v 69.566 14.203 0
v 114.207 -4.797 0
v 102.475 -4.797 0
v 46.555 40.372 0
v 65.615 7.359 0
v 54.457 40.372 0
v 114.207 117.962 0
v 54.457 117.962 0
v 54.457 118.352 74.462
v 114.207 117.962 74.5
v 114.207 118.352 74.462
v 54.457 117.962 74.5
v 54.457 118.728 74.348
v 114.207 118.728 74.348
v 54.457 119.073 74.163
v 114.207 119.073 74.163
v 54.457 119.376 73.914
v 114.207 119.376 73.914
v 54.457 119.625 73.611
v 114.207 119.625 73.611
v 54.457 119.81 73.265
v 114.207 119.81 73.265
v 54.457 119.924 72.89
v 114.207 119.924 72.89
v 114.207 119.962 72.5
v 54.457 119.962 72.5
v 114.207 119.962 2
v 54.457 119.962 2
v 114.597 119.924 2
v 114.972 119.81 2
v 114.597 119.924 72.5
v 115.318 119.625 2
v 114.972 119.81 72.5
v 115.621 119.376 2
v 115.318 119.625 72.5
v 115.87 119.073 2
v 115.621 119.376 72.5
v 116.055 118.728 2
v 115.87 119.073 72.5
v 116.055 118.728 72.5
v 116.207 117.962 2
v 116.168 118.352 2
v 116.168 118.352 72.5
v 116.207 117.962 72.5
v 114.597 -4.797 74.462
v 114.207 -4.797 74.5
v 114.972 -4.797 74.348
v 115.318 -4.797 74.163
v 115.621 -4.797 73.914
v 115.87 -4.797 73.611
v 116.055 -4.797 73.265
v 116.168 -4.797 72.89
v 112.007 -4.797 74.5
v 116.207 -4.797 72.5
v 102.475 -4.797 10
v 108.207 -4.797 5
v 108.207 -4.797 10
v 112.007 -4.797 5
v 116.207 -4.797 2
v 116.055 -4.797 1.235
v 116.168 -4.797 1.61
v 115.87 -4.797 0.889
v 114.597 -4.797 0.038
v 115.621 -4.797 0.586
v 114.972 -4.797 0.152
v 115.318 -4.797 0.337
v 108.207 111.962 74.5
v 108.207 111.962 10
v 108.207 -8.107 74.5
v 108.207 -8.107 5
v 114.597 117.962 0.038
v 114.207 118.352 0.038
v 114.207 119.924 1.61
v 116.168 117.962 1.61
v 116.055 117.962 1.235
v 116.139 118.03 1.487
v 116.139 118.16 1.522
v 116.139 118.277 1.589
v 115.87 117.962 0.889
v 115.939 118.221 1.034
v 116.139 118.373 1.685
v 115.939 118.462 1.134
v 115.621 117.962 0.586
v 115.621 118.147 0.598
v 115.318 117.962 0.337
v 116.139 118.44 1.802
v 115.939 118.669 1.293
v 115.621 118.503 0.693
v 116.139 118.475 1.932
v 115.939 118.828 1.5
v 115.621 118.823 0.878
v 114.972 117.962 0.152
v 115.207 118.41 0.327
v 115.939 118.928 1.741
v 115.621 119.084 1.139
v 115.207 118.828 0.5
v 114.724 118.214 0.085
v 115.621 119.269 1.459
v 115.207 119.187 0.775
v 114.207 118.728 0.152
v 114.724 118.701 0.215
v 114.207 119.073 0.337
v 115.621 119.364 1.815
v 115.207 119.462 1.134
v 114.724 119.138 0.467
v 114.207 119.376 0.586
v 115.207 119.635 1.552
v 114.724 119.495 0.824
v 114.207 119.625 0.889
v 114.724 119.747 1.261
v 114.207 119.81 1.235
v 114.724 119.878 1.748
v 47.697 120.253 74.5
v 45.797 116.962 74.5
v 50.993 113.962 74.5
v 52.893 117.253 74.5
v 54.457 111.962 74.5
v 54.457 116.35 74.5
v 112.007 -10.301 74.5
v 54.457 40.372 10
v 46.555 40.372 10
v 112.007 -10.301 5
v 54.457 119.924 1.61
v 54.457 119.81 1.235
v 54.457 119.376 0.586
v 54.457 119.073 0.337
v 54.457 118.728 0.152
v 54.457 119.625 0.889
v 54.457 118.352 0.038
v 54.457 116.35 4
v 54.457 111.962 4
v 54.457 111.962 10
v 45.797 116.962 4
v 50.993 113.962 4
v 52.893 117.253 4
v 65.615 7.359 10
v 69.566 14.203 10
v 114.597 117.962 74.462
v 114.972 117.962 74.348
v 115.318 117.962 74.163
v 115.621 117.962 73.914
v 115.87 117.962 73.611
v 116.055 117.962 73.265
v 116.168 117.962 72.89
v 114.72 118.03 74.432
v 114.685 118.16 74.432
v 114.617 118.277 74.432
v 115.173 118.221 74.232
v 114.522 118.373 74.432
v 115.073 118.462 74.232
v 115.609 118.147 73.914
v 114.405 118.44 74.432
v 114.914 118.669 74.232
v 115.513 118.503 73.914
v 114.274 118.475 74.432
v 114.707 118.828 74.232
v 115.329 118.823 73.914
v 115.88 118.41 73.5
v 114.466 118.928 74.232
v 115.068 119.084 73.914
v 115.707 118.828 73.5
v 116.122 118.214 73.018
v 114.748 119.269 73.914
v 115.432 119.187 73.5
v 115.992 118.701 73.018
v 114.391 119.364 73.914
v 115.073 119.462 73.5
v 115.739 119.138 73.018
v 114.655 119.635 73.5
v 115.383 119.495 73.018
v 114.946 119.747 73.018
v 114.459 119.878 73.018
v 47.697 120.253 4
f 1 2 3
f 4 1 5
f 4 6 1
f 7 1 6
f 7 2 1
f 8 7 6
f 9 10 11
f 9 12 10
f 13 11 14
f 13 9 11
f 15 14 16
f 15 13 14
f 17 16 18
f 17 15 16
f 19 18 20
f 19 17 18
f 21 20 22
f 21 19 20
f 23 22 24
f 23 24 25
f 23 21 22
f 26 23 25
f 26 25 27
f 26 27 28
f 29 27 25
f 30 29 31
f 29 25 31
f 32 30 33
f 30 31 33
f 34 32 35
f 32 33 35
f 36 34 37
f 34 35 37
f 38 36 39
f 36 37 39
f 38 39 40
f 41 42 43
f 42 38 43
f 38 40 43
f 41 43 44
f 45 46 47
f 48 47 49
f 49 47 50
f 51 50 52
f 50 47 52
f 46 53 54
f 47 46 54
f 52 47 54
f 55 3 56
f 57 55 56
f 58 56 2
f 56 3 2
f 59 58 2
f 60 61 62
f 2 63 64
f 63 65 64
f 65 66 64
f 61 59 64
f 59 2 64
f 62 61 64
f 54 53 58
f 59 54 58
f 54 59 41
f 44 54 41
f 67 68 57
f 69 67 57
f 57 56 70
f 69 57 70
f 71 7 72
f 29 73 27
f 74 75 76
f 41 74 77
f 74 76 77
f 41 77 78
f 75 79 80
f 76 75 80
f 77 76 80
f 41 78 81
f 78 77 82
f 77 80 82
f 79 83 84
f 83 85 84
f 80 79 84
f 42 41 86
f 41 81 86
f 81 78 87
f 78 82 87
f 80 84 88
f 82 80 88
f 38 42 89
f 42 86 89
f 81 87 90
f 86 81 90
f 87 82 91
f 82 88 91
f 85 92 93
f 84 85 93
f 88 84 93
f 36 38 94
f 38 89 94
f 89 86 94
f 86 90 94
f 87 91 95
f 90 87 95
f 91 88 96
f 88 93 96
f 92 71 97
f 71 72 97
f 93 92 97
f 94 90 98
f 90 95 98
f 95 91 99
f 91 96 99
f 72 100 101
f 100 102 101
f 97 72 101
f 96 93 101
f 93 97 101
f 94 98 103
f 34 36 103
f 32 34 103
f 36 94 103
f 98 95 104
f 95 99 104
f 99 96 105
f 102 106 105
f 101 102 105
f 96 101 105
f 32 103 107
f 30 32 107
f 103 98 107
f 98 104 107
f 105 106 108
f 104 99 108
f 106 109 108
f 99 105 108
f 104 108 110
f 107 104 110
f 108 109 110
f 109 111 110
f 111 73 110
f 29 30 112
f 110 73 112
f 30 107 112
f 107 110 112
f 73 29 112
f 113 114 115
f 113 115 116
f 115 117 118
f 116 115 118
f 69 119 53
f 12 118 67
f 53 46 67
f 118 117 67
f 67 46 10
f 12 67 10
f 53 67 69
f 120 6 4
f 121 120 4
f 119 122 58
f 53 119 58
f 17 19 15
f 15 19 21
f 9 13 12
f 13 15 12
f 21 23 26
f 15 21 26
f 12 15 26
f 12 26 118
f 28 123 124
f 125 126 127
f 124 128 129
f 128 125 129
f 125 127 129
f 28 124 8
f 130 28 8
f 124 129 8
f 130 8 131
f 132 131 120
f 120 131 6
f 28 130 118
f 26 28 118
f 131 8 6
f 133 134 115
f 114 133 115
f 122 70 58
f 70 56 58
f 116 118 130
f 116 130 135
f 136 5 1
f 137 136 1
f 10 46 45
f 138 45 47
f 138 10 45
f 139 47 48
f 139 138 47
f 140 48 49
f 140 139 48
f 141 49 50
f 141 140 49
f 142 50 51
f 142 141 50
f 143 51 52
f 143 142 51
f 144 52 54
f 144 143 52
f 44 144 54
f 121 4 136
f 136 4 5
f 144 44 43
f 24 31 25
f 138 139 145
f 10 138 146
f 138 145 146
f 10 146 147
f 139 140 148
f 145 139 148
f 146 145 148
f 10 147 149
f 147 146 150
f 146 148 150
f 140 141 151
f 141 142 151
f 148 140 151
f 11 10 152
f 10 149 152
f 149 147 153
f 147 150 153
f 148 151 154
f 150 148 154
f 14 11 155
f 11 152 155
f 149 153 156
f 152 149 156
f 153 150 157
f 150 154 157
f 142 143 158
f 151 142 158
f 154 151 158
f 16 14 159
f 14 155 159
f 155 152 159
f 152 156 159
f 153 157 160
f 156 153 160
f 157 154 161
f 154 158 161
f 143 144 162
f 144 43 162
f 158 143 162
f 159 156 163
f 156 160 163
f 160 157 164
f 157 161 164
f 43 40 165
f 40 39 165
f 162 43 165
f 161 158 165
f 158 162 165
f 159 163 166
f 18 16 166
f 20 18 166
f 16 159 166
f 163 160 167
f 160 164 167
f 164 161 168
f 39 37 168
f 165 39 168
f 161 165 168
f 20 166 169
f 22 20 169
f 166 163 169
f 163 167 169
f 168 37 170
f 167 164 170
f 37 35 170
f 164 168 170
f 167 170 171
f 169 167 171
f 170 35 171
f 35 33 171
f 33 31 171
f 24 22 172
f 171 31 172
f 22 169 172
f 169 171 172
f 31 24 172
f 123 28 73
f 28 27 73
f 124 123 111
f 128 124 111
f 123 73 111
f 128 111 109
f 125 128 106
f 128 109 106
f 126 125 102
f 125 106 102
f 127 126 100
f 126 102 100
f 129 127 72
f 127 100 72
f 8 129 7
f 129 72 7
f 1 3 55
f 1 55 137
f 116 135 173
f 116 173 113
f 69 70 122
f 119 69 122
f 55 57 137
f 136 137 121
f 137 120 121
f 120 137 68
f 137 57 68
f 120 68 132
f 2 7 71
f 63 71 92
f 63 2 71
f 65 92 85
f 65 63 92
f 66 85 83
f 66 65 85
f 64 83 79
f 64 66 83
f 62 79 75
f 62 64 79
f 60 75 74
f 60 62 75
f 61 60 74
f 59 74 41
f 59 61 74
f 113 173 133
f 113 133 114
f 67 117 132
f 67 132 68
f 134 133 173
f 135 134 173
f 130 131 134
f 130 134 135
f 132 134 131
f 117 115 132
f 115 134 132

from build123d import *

# Parameters (mm, degrees)
EXTRUDE_1_DEPTH     = 10
EXTRUDE_2_DEPTH     = 64.5
SKETCH_4_W          = 3.8
SKETCH_4_H          = 69.5
EXTRUDE_4_DEPTH     = 1
EXTRUDE_5_DEPTH     = 69.5
EXTRUDE_6_DEPTH     = 70.5
FILLET_1_R          = 2
SKETCH_7_W          = 70.5
SKETCH_7_H          = 3.8
EXTRUDE_7_DEPTH     = 6
CUT_EXTRUDE_1_REACH = 185.071


with BuildPart() as part:
    # 草圖1 → 填料-伸長1 (new body)
    with BuildSketch(Plane.XY):
        Polygon((116.20678675, 119.962196633), (116.20678675, -4.797282637), (104.20678675, -4.797282637), (104.20678675, -5.797282637), (69.565770598, 14.202717363), (54.456814697, 40.372196633), (54.456814697, 119.962196633), align=None)
        Polygon((54.456814697, 40.372196633), (46.554726499, 40.372196633), (65.614726499, 7.35930824), (69.565770598, 14.202717363), align=None)
    extrude(amount=EXTRUDE_1_DEPTH)

    # 草圖2 → 填料-伸長2 (add)
    with BuildSketch(Plane.XY.offset(10)):
        Polygon((108.20678675, -4.797282637), (116.20678675, -4.797282637), (116.20678675, 119.962196633), (54.456814697, 119.962196633), (54.456814697, 111.962196633), (108.20678675, 111.962196633), align=None)
    extrude(amount=EXTRUDE_2_DEPTH)

    # 草圖4 → 填料-伸長4 (add)
    with BuildSketch(Plane.XZ.offset(4.797282637)):
        with Locations((110.10678675, 39.75)):
            Rectangle(SKETCH_4_W, SKETCH_4_H)
    extrude(amount=EXTRUDE_4_DEPTH)

    # 草圖5 → 填料-伸長5 (add)
    with BuildSketch(Plane(origin=(0, 0, 5), x_dir=(-1, 0, 0), z_dir=(0, 0, -1))):
        Polygon((-108.20678675, -5.797282637), (-108.20678675, -8.106683714), (-112.00678675, -10.300614737), (-112.00678675, -5.797282637), align=None)
    extrude(amount=-EXTRUDE_5_DEPTH)

    # 草圖6 → 填料-伸長6 (add)
    with BuildSketch(Plane.XY.offset(74.5)):
        Polygon((50.992713082, 113.962196633), (54.456814697, 111.962196633), (54.456814697, 116.350058678), (52.892713082, 117.253093167), align=None)
    extrude(amount=-EXTRUDE_6_DEPTH)

    # 圓角1
    fillet_1_edges = [part.edges().sort_by_distance(p)[0] for p in [
        (85.331800723, 119.962196633, 0),
        (116.20678675, 57.582456998, 0),
        (116.20678675, 119.962196633, 37.25),
        (116.20678675, 57.582456998, 74.5),
        (85.331800723, 119.962196633, 74.5),
    ]]
    fillet(fillet_1_edges, radius=FILLET_1_R)

    # 草圖7 → 填料-伸長7 (add)
    with BuildSketch(Plane(origin=(-11.102543866, 6.41005669, 0), x_dir=(0, 0, 1), z_dir=(-0.8660254037844396, 0.4999999999999985, 0))):
        with Locations((39.25, 126.090513896)):
            Rectangle(SKETCH_7_W, SKETCH_7_H)
    extrude(amount=EXTRUDE_7_DEPTH)

    # 草圖8 → 除料-伸長1 (cut, up to next)
    with BuildSketch(Plane(origin=(0, 0, 0), x_dir=(-1, 0, 0), z_dir=(0, 0, -1)), mode=Mode.PRIVATE) as cut_extrude_1_sk1:
        Polygon((-104.20678675, -4.797282637), (-102.474735942, -4.797282637), (-104.20678675, -5.797282637), align=None)
    cut_extrude_1_tool1 = extrude(cut_extrude_1_sk1.sketch, amount=-CUT_EXTRUDE_1_REACH, mode=Mode.PRIVATE) & part.part
    add(cut_extrude_1_tool1.solids().sort_by_distance((103.629436, -5.130616, 0))[0], mode=Mode.SUBTRACT)


solid = part.part
